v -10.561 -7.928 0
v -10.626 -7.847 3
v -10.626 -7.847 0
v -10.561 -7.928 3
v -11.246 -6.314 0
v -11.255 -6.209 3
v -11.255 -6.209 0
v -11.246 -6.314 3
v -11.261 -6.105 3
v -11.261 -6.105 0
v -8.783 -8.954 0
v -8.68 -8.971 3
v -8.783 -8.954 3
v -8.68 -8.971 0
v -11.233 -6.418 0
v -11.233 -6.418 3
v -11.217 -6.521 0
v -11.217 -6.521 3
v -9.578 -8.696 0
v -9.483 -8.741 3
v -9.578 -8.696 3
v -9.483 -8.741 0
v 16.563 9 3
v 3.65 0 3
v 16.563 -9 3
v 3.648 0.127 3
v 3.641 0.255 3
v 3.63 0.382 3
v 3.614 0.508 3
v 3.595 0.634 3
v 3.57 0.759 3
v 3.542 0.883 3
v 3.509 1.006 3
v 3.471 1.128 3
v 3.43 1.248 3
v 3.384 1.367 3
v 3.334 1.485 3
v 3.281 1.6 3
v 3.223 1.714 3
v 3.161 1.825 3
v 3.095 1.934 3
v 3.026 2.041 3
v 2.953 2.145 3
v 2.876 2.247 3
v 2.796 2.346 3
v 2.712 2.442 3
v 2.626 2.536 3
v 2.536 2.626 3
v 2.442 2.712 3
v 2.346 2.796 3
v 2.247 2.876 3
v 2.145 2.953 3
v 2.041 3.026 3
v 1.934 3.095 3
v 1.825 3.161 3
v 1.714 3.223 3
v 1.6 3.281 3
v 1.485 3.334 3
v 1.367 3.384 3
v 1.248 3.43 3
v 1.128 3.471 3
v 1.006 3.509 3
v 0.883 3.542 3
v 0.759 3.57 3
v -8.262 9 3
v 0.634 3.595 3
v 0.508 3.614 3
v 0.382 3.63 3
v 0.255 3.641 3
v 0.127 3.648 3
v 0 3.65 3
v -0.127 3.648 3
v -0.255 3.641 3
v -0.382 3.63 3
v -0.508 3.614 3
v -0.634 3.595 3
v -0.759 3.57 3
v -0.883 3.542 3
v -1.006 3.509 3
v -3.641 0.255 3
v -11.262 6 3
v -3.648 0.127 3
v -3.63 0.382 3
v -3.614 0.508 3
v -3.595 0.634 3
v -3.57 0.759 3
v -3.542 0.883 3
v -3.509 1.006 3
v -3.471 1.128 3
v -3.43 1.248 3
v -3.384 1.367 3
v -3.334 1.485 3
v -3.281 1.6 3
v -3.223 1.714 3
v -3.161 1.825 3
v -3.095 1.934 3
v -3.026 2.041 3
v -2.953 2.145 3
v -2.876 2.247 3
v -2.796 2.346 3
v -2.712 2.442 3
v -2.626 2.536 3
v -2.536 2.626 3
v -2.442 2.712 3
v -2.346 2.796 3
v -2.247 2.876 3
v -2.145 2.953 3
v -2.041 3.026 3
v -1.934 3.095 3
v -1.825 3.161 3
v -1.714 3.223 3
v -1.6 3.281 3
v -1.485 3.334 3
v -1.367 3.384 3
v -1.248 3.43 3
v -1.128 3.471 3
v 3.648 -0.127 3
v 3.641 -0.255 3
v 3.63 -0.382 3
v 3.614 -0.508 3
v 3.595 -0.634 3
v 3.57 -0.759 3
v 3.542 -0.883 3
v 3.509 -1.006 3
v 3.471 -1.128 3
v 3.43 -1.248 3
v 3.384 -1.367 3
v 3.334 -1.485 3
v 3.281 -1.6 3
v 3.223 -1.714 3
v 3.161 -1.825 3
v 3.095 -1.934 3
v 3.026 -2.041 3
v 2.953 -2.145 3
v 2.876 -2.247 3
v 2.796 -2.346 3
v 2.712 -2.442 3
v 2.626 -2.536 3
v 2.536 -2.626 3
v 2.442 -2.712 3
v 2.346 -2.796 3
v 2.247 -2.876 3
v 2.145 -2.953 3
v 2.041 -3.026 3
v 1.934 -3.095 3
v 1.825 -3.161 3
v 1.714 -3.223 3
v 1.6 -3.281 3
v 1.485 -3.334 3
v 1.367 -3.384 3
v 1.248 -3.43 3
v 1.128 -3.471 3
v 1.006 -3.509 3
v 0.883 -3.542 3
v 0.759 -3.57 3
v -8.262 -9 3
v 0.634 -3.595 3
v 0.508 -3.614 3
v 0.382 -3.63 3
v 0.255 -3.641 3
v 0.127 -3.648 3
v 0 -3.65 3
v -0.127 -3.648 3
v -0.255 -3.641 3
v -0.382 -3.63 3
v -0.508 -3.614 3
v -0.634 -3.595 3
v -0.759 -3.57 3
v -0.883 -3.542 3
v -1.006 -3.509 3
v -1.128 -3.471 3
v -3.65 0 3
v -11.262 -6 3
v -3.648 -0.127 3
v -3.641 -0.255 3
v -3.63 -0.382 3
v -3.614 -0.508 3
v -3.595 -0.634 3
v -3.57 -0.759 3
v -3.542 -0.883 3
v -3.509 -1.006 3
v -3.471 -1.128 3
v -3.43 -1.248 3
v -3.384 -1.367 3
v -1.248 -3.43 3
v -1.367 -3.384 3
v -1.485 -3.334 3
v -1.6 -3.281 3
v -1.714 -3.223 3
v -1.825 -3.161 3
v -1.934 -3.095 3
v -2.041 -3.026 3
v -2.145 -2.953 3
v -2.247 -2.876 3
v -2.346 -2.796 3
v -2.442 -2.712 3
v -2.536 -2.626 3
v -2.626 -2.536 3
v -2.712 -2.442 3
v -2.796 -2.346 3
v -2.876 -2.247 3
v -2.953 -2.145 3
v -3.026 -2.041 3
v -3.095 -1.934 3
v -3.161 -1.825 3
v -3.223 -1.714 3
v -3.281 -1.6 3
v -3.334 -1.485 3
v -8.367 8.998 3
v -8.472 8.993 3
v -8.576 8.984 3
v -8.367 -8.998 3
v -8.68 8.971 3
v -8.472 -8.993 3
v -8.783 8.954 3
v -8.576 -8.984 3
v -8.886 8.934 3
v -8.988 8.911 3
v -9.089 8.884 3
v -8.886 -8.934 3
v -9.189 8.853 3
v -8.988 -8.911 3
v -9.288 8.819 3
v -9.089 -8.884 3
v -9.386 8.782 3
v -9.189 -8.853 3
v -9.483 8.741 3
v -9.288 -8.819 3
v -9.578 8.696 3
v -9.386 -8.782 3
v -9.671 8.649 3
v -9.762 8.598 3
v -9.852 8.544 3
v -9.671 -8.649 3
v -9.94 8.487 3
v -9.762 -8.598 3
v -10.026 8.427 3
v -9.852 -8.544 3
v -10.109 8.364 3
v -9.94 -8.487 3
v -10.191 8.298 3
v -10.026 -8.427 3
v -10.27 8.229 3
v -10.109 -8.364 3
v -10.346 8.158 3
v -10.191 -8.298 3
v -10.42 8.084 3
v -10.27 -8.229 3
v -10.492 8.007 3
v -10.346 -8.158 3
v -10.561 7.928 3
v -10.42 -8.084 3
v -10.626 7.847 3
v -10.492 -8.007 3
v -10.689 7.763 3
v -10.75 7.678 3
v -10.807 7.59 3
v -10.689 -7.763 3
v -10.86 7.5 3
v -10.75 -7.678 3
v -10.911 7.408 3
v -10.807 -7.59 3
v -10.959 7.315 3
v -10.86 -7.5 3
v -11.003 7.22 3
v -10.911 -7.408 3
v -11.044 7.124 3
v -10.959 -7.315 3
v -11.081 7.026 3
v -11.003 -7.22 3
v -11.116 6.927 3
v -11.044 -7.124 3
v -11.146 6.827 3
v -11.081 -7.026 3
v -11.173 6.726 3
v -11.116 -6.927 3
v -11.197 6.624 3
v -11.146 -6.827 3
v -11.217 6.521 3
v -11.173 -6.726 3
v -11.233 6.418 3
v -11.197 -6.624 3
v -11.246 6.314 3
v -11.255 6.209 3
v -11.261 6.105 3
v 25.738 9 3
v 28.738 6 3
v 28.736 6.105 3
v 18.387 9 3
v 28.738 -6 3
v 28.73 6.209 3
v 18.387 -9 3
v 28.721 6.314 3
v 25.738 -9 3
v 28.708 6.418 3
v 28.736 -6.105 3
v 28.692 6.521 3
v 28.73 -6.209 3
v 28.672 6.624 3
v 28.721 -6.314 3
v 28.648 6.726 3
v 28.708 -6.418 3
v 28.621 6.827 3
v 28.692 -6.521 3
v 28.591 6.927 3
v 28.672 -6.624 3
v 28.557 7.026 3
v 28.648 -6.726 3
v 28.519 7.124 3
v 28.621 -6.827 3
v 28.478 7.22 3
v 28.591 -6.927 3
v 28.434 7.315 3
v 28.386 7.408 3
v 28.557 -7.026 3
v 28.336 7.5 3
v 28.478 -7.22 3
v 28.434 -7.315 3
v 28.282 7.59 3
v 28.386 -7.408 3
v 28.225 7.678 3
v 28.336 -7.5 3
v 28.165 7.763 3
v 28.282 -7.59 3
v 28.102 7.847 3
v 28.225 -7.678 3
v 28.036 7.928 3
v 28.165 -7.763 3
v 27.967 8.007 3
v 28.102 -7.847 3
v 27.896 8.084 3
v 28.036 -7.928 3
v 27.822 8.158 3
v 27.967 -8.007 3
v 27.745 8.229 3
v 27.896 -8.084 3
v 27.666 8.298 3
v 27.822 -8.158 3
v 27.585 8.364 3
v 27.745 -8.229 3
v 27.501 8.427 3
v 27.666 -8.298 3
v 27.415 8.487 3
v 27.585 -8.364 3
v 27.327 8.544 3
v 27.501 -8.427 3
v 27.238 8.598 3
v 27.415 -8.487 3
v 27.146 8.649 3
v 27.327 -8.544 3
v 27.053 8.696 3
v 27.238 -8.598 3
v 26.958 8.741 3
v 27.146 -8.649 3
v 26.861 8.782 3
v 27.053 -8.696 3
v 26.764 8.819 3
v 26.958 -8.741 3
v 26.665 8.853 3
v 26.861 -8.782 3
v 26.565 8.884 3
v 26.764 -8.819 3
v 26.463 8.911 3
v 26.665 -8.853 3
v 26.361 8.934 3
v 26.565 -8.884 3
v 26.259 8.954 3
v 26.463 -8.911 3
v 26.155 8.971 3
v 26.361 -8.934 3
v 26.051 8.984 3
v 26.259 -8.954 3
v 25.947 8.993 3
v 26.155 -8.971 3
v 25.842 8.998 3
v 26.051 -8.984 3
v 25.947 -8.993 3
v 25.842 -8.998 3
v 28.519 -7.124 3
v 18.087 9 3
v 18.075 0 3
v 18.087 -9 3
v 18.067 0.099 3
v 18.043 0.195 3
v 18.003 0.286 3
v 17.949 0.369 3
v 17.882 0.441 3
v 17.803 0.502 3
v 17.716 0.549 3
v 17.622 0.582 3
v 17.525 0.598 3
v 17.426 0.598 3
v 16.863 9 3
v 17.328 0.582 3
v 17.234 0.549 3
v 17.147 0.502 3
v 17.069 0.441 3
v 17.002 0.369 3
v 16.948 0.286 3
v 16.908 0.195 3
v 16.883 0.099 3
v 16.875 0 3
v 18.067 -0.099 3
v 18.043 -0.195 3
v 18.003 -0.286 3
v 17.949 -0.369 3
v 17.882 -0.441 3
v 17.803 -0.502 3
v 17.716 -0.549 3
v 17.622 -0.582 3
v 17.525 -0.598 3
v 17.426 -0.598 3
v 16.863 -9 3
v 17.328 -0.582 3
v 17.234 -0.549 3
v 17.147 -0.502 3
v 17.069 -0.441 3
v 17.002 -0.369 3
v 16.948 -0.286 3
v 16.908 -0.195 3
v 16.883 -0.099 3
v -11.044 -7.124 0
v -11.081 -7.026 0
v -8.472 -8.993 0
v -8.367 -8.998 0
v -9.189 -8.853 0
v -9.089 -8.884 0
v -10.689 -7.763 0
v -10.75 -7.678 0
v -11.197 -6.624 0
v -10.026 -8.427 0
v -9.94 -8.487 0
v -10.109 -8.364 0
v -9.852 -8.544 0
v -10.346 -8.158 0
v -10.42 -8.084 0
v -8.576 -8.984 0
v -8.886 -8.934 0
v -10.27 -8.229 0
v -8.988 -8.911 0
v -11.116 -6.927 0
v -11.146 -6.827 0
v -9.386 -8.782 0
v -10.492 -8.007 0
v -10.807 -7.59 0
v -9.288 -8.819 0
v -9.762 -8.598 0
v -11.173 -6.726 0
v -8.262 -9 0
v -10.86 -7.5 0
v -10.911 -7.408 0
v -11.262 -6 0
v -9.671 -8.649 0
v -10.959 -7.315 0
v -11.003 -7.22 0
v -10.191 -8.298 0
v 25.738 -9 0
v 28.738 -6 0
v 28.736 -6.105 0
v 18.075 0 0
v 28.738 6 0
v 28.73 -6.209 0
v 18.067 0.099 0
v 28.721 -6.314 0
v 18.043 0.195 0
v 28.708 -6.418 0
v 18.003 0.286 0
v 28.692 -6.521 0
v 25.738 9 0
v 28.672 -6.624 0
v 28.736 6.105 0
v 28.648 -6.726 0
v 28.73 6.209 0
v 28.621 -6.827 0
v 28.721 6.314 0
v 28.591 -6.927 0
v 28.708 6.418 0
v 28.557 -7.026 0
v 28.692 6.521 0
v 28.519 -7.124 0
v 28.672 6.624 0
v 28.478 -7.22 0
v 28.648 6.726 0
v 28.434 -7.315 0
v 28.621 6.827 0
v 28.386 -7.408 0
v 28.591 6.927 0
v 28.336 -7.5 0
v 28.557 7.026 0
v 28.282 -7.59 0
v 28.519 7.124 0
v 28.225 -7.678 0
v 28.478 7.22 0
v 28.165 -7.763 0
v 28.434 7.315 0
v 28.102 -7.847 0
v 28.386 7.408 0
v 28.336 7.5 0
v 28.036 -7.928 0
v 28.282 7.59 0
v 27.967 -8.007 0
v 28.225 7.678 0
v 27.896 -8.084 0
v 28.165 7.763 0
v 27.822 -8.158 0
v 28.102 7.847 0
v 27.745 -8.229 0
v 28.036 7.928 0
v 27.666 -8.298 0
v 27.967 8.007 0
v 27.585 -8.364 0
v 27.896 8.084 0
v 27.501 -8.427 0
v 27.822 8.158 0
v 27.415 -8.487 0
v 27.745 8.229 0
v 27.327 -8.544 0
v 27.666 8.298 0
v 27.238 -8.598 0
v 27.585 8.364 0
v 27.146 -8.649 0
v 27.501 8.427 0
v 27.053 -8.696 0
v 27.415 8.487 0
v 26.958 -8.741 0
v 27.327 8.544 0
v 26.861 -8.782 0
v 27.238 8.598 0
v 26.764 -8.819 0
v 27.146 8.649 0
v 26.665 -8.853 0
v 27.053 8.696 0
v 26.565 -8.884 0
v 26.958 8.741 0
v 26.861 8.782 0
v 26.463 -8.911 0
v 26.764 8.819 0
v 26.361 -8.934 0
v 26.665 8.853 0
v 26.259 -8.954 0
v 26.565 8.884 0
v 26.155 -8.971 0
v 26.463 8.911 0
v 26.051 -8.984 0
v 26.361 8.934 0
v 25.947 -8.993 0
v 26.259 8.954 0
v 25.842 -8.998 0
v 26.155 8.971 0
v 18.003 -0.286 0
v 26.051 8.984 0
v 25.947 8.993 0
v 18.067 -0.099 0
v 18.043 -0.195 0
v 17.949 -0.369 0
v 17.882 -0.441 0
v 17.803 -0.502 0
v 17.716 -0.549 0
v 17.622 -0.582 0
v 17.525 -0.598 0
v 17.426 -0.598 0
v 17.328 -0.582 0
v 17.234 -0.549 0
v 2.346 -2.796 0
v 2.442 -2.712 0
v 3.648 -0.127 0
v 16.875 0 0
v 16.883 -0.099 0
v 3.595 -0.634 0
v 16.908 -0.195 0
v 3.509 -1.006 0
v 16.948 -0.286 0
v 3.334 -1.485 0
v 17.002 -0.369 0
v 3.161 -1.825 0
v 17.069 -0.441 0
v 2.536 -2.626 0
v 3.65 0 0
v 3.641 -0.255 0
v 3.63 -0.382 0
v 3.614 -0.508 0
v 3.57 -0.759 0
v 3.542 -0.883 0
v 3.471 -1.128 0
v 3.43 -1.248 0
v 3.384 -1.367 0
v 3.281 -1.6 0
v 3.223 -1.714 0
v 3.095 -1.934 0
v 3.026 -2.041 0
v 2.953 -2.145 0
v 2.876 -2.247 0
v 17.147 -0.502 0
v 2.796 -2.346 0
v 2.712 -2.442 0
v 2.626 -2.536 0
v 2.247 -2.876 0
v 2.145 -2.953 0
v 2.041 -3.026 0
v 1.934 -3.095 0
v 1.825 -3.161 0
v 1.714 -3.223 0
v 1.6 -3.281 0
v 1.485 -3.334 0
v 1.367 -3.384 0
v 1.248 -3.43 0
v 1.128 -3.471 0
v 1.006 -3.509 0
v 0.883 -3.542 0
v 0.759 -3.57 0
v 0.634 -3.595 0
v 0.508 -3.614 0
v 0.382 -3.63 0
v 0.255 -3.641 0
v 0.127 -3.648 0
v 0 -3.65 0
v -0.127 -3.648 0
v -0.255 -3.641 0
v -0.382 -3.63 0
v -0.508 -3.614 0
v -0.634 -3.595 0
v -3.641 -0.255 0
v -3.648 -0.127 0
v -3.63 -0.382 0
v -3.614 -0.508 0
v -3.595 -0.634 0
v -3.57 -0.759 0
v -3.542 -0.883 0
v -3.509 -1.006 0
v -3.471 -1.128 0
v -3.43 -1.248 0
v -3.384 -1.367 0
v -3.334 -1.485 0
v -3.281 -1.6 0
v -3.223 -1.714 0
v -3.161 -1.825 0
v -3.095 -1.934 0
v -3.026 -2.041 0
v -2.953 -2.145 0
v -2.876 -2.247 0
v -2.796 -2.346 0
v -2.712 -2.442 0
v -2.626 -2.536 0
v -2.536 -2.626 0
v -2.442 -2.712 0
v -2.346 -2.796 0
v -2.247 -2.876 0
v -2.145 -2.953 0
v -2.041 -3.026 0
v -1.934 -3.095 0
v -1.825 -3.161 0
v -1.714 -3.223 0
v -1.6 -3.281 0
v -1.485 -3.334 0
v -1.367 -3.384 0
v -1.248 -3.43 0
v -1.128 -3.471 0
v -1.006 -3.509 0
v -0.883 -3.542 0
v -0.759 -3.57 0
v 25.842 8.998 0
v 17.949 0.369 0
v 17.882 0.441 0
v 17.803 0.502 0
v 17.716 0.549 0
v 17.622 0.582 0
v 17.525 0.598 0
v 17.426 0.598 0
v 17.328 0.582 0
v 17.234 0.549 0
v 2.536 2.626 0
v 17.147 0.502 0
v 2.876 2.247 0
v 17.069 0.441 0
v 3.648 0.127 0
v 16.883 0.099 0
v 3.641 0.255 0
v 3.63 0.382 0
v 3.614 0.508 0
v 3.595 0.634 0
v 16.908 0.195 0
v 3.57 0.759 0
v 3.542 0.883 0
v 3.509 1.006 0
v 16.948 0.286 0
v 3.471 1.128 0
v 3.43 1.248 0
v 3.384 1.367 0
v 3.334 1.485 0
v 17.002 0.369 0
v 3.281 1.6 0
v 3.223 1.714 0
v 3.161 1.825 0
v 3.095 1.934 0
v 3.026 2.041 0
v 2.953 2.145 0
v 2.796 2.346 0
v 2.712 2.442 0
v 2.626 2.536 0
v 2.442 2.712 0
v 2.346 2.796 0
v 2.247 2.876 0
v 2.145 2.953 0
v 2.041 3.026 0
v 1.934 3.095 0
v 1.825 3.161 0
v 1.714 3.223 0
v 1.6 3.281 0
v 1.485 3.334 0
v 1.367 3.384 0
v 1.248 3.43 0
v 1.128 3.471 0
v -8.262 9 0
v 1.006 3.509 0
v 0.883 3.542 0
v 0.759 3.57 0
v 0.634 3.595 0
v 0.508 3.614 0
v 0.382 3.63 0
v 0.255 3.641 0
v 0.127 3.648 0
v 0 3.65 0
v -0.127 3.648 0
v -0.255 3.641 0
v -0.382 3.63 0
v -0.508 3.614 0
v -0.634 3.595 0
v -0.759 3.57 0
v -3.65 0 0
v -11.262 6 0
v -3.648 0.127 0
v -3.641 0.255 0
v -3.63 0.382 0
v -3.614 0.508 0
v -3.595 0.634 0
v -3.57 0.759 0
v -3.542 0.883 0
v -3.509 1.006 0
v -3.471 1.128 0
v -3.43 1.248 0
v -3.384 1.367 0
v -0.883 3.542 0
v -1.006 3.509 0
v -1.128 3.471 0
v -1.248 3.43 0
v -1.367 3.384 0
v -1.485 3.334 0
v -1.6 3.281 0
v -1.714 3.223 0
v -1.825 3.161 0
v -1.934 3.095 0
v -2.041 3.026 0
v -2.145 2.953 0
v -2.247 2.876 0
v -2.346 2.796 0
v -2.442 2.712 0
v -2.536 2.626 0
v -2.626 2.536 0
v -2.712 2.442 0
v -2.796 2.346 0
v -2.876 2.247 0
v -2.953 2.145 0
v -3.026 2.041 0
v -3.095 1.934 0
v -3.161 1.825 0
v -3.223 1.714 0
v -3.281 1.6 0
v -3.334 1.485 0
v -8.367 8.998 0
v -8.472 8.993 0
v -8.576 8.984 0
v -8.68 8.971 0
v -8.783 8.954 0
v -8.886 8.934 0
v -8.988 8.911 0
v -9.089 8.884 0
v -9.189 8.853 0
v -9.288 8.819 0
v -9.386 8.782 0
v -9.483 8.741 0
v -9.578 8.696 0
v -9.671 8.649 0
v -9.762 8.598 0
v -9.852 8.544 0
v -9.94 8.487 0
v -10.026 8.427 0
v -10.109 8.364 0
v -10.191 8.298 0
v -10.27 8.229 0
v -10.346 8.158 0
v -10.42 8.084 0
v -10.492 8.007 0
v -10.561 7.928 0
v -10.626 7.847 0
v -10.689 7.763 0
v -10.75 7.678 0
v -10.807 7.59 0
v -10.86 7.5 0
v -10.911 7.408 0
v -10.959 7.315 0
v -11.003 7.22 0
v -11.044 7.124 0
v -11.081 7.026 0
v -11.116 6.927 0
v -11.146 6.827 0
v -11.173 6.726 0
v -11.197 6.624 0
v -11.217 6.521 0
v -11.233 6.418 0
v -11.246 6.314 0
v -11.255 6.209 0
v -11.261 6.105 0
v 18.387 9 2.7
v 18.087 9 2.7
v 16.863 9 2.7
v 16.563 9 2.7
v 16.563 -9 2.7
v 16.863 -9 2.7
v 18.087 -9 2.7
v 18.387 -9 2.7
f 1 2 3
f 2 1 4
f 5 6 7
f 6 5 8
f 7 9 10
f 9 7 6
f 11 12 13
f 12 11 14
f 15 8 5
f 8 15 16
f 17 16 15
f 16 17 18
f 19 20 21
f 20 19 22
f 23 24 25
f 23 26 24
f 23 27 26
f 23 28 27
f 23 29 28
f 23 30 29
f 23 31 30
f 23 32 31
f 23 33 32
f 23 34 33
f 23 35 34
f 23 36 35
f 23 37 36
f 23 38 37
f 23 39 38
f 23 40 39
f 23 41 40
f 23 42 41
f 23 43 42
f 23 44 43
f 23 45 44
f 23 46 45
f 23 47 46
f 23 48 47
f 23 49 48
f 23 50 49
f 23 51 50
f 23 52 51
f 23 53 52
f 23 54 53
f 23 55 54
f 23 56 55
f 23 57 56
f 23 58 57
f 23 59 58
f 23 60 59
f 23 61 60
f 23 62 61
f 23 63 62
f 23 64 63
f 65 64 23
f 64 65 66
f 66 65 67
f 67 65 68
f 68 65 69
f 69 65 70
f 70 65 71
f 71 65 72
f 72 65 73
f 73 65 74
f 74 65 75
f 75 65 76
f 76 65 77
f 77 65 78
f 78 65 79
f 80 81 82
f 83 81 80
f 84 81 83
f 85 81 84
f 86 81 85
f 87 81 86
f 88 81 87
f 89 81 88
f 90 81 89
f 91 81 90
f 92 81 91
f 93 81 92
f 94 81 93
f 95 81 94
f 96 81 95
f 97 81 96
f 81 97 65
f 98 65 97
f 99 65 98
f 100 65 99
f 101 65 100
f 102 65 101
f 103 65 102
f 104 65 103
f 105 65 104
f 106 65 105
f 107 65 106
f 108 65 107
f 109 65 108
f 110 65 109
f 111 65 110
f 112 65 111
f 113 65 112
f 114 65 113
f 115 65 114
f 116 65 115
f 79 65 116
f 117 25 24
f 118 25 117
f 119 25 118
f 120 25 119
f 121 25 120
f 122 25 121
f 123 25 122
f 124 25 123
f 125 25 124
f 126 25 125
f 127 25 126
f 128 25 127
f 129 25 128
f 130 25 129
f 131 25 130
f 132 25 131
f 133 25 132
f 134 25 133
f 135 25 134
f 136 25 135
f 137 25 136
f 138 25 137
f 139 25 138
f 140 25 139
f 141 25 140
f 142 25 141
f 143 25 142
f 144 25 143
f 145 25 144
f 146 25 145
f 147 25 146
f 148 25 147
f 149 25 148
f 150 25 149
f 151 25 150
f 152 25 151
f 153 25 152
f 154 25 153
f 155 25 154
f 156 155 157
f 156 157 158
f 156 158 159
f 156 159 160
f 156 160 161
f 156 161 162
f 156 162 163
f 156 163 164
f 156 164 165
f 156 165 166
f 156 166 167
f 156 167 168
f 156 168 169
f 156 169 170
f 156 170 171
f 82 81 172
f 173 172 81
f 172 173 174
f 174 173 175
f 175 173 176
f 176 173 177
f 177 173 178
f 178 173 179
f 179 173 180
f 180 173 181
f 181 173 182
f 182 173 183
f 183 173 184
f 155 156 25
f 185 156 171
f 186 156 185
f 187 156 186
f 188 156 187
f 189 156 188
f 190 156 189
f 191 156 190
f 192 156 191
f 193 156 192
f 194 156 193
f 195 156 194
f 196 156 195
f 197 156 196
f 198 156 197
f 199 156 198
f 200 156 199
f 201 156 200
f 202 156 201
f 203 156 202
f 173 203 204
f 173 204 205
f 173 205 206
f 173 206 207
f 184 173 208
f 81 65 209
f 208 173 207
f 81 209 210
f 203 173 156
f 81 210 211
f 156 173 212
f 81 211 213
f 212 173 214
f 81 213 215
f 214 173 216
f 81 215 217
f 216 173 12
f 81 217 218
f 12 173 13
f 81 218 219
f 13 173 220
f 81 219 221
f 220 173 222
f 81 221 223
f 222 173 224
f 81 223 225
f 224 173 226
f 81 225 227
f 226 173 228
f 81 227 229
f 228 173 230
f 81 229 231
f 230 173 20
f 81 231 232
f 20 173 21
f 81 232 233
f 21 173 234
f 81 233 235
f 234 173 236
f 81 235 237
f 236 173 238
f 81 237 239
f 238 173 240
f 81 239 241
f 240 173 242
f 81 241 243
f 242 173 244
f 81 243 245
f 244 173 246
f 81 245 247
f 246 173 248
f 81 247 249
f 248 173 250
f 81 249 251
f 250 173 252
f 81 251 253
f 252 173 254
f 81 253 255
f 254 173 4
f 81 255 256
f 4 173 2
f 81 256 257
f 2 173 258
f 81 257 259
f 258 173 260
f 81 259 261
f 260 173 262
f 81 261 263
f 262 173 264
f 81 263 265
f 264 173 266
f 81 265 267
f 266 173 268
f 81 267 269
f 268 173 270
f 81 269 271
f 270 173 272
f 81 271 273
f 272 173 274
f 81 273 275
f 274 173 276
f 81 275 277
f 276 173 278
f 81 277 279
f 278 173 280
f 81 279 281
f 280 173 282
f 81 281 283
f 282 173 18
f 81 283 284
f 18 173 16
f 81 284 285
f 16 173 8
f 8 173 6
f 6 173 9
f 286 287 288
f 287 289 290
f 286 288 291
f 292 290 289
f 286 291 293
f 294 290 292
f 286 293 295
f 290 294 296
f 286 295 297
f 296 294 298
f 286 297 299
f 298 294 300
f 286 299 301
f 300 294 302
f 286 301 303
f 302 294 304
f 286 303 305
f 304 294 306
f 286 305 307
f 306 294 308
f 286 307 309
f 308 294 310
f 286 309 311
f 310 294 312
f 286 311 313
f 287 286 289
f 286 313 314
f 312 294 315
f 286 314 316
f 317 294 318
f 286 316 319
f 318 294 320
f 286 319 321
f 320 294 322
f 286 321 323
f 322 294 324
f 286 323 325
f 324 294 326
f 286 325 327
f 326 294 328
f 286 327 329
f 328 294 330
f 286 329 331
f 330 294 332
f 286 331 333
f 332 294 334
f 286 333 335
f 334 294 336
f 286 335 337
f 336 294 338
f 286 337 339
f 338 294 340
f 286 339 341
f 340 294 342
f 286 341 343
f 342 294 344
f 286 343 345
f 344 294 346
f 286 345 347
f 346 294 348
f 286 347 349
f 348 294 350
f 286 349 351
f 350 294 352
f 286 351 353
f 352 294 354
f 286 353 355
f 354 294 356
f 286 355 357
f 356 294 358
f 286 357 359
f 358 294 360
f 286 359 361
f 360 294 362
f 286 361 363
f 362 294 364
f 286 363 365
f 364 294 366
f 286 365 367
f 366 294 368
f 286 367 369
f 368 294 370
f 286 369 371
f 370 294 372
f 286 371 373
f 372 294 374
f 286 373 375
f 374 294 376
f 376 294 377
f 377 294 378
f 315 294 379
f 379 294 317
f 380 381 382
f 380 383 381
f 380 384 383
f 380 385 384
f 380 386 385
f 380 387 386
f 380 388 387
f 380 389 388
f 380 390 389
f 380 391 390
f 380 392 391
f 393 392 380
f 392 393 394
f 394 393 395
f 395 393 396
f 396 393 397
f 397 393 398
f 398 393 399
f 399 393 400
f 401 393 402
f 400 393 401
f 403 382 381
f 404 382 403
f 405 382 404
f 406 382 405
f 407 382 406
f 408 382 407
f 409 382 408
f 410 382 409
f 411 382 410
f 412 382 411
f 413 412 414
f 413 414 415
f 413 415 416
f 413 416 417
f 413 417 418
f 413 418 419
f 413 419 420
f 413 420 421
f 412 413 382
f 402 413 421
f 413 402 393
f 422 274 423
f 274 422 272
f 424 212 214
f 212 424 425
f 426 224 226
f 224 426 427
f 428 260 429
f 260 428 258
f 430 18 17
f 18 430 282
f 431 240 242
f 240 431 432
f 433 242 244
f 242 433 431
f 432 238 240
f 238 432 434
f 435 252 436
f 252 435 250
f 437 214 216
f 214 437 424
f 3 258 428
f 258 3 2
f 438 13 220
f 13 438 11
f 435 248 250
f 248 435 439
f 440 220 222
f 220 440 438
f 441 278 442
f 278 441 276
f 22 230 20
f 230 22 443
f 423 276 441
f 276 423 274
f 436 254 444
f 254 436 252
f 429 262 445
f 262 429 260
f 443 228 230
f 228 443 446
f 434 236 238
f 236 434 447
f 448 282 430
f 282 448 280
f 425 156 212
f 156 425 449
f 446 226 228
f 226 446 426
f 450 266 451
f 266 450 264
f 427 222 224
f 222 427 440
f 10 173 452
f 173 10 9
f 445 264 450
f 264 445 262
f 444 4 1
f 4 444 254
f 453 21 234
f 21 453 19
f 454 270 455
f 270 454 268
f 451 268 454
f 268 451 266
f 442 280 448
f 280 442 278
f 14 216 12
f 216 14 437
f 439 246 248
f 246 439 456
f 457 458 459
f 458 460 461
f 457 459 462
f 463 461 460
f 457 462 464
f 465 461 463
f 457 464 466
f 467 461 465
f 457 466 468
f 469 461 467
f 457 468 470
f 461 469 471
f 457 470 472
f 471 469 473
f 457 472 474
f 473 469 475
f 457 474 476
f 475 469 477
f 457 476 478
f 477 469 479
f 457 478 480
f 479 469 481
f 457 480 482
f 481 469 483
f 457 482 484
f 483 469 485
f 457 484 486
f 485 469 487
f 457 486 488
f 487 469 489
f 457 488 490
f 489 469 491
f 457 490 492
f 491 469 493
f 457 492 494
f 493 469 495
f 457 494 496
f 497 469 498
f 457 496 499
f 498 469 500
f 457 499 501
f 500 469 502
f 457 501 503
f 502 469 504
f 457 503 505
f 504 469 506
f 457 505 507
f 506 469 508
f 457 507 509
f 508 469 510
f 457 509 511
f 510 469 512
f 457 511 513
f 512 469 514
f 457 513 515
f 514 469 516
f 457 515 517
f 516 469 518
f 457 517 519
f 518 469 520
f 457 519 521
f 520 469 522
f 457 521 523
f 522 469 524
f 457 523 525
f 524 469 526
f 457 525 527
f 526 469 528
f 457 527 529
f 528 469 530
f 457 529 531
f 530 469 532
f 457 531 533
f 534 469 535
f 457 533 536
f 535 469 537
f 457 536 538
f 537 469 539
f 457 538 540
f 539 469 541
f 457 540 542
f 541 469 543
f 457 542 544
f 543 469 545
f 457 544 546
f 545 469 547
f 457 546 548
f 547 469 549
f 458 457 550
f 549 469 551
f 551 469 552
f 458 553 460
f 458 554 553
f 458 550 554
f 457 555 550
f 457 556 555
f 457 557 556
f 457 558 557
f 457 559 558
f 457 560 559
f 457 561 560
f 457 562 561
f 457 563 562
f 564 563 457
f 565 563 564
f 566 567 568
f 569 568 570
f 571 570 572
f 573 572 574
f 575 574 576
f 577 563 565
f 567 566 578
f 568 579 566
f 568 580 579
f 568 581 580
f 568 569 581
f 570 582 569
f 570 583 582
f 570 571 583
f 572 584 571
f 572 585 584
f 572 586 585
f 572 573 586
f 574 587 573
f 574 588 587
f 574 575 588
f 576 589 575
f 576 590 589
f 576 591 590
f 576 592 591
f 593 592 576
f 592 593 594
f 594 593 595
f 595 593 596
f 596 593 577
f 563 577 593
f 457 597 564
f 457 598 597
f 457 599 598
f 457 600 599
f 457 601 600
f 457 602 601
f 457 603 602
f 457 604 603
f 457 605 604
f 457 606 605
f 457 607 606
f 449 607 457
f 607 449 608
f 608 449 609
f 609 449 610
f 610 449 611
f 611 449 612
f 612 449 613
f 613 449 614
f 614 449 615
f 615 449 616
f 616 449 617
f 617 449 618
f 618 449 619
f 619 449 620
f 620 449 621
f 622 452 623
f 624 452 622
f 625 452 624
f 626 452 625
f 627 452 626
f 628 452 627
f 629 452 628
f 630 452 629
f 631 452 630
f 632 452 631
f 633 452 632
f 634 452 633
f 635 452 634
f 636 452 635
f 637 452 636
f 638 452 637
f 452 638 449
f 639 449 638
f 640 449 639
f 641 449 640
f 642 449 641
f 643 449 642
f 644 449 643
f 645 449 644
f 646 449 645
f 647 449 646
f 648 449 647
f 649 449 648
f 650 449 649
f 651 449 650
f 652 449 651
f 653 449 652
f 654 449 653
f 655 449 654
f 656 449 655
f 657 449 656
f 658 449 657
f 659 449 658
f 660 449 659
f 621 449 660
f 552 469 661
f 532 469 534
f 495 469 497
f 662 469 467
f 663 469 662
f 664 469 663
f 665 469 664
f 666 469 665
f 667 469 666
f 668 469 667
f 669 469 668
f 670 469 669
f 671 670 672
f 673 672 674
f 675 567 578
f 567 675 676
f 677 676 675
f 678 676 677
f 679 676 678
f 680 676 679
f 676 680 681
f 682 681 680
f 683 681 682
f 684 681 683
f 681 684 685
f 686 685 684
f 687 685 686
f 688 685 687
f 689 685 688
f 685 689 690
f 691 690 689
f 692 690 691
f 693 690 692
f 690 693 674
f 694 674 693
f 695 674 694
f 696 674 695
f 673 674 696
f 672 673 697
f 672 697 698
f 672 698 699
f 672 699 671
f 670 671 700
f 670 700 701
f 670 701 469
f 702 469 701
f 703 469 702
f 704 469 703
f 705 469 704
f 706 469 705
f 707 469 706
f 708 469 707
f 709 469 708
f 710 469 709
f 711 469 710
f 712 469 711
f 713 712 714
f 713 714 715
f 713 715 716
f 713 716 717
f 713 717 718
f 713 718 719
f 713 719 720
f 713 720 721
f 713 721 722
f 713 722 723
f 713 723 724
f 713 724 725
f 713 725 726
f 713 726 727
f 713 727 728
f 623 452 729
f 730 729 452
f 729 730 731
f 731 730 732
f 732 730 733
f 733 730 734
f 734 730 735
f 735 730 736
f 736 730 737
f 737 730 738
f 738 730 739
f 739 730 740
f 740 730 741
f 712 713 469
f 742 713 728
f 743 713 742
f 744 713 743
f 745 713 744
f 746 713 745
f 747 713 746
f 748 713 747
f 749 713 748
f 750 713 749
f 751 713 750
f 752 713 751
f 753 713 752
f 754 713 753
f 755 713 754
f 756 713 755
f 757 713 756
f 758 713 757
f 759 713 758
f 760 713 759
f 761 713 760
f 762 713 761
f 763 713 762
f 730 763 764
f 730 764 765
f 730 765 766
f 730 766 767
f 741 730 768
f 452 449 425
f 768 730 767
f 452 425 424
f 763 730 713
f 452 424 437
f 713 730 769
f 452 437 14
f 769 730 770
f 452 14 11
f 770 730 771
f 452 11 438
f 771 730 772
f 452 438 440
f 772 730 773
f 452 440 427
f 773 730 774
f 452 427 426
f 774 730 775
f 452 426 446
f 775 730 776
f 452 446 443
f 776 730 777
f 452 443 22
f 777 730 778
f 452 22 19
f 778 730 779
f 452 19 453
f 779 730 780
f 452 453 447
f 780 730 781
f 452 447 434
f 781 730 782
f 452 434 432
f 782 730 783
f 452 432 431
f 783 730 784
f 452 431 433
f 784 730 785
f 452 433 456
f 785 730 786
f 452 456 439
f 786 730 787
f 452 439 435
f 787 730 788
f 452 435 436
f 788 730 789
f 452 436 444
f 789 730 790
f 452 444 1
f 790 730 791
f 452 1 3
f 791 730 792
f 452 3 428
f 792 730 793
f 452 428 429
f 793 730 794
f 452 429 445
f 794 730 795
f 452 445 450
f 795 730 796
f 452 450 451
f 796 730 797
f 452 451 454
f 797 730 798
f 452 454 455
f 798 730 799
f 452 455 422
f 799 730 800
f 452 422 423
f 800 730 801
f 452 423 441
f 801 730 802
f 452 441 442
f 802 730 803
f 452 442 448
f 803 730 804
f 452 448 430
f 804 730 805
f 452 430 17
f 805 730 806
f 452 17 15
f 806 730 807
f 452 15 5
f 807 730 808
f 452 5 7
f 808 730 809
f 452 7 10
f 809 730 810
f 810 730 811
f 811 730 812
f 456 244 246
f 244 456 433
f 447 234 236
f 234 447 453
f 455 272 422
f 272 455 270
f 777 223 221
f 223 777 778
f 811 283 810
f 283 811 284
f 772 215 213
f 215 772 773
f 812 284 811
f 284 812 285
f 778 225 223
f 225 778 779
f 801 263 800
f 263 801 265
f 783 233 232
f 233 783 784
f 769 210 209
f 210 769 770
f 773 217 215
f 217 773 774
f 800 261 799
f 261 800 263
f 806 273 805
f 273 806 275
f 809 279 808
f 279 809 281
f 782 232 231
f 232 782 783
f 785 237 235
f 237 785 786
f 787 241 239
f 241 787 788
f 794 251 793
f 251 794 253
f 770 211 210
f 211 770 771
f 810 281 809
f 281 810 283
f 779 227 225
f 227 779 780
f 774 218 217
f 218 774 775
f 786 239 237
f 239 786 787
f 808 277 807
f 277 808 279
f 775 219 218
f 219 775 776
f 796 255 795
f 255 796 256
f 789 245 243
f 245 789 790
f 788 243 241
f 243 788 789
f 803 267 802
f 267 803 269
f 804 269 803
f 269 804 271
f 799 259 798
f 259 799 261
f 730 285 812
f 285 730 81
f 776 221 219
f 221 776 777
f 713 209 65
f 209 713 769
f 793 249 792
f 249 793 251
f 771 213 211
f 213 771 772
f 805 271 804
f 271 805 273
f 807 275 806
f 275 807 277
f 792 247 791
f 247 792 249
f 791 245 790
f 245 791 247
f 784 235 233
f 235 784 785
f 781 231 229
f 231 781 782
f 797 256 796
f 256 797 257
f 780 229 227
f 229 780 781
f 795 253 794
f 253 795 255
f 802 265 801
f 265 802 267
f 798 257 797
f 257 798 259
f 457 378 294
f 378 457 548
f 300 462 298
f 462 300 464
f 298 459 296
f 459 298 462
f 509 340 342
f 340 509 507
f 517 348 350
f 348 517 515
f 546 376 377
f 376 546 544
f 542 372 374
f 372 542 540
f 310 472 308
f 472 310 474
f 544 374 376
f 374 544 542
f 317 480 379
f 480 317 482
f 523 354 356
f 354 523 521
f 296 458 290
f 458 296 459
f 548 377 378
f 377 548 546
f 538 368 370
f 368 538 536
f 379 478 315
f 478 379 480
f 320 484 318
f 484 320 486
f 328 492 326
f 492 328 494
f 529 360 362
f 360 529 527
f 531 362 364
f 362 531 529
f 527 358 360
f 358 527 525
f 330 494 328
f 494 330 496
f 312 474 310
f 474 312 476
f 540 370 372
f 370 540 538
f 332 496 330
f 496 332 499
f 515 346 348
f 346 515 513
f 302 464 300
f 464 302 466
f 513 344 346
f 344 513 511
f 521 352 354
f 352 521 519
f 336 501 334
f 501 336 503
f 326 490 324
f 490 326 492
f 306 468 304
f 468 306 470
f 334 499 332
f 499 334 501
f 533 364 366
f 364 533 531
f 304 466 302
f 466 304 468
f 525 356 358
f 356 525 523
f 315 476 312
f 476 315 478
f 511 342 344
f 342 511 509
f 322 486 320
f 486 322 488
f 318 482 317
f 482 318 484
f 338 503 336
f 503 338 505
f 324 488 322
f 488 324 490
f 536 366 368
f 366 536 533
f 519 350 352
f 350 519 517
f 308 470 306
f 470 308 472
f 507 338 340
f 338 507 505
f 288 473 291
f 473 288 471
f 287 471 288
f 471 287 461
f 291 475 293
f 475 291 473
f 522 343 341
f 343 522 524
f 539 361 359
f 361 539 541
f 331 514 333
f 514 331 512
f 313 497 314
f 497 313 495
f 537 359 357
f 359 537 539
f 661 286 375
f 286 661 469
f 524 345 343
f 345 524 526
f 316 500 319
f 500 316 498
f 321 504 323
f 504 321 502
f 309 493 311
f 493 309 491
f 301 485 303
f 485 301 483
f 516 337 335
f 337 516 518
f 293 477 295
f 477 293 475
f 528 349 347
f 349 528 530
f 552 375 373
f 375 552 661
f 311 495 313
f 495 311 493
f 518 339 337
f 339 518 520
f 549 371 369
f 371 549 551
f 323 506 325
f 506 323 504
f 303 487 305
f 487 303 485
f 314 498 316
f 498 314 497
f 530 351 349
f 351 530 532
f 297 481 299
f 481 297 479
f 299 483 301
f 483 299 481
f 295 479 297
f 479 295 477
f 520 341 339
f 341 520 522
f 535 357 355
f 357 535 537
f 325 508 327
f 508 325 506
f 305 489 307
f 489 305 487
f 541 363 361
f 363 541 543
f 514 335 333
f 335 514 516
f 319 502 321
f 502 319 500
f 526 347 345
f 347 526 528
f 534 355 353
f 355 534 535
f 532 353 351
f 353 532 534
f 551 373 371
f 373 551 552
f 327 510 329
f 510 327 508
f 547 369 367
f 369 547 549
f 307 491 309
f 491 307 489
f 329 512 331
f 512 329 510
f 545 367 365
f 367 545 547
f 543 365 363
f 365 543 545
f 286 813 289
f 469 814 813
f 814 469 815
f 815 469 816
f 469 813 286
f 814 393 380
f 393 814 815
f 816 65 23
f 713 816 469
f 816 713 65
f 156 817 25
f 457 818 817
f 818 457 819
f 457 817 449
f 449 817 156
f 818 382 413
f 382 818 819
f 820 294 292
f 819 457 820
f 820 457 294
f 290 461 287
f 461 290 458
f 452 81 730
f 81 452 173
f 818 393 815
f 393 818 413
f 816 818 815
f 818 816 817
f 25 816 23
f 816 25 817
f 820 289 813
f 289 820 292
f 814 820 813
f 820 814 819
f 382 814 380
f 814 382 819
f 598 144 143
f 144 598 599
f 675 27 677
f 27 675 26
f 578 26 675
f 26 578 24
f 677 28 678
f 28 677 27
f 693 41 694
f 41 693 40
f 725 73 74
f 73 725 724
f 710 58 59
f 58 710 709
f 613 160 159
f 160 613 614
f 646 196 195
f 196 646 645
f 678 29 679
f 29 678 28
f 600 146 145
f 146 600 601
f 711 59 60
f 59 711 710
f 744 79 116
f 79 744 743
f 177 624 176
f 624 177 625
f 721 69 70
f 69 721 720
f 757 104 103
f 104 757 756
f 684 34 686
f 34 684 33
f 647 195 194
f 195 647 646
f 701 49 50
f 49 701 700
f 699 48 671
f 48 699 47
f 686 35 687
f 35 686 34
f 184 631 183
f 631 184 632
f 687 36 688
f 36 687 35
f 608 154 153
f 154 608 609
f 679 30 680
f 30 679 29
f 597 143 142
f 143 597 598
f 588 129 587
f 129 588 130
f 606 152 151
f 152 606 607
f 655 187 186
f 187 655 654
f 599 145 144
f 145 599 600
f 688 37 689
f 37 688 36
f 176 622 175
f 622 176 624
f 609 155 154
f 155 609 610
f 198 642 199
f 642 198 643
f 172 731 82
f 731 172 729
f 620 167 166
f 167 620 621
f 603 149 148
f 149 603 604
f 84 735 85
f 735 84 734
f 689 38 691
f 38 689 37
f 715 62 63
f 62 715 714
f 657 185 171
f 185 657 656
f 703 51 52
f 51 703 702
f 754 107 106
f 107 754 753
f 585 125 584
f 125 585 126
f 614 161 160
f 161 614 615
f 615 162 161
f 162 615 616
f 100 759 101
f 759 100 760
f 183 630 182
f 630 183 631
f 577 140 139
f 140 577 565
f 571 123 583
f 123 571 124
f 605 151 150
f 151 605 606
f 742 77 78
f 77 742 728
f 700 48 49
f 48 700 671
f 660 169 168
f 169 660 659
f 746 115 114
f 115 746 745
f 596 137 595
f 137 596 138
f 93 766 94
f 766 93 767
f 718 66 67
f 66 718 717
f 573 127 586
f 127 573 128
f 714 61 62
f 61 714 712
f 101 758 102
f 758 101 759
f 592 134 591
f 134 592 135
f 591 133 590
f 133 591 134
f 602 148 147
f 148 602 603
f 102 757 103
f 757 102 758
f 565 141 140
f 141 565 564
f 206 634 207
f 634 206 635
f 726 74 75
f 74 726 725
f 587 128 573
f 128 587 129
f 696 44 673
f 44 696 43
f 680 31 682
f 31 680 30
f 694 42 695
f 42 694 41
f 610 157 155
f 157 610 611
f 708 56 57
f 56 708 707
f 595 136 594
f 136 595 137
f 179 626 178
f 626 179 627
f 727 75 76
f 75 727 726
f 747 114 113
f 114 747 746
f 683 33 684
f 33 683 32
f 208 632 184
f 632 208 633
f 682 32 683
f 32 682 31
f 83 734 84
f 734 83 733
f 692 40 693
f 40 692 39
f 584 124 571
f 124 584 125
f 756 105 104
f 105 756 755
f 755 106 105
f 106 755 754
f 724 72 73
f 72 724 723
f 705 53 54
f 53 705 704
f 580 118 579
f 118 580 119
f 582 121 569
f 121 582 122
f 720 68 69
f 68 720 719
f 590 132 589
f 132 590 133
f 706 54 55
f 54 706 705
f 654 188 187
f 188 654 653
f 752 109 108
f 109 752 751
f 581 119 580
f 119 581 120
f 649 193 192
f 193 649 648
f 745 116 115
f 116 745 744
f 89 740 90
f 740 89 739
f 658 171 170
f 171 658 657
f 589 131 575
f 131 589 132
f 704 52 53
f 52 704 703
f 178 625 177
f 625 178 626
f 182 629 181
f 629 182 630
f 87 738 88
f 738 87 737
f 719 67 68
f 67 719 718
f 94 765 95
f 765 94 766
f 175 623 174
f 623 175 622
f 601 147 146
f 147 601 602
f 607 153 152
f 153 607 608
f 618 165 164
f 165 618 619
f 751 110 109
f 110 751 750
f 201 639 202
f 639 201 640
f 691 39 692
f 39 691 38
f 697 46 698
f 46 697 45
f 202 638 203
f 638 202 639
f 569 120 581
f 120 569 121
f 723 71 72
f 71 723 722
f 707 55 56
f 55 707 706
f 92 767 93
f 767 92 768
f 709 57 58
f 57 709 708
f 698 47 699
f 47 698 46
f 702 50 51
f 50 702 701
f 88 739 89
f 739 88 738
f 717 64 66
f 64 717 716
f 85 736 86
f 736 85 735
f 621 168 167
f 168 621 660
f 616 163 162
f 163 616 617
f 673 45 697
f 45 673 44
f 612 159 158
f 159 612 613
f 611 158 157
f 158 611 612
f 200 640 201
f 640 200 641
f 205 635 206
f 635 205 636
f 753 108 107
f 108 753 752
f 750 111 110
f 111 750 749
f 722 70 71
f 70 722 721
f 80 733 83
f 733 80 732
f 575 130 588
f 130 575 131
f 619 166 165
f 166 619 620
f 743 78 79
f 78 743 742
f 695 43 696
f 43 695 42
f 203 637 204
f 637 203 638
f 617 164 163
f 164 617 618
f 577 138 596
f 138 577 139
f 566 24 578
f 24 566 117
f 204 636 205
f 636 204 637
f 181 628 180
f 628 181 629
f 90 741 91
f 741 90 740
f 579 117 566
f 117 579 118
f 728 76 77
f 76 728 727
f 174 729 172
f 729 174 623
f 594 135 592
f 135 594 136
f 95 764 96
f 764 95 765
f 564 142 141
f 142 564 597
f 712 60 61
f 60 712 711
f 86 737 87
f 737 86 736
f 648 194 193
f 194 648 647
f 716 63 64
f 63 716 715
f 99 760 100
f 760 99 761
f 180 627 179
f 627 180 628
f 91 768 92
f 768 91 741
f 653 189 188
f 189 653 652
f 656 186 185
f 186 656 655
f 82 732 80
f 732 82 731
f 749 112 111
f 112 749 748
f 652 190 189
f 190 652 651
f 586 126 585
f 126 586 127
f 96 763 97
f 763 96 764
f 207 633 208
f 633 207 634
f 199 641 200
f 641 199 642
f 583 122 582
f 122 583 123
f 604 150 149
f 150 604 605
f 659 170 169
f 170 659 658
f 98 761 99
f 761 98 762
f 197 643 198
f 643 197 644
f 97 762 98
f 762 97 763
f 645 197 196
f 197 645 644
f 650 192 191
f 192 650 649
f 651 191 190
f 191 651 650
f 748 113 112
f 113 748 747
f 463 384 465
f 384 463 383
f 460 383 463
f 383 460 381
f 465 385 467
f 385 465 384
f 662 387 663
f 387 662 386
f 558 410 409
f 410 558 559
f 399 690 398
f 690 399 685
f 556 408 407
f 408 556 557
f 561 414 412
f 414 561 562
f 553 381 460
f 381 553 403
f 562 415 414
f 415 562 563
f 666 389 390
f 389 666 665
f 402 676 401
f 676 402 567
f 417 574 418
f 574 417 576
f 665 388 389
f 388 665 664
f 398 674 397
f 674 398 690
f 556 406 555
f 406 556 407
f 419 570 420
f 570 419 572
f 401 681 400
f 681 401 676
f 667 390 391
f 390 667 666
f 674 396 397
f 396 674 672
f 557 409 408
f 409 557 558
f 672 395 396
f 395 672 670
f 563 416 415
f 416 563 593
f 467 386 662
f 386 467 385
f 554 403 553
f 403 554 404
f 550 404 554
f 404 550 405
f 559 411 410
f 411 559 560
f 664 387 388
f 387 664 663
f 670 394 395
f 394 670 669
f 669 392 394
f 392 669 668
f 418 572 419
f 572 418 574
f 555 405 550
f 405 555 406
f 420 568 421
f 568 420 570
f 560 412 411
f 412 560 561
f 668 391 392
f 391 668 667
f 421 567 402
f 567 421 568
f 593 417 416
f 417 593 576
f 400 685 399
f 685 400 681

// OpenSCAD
// file: ../lib/common.scad
// Shared helpers for the AR turntable part models.
//
// Every part file holds a parameter table P. Each row is:
//   [id, description, value_mm, evidence, display_unit, source_or_how_to_check]
//
// Evidence codes:
//   F  factory document          O  owner report
//   C  community drawing         S  industry standard
//   D  design choice             M  measured for this repository
//   DV derived from cited sources, not yet verified on a part. The source
//      column holds the derivation: the formula, each input with its source,
//      and how to verify. Drawn in blue. Needs a row in TO-CONFIRM.md whose
//      value starts with "Derived:". Change to M once measured.
//   PH placeholder: chosen only so the model has a shape. It is NOT a
//      measurement. Drawn in red. Replace it, and change the code, once it
//      is measured.
//
// Every part file also emits metadata naming the part page, the part, the
// version, the material and the tables it fits, each fit with its evidence:
//   ["part", "parts/counterweight.md"], ["part_name", "Counterweight"],
//   ["version", "XA brass weight, 1961 to 1979"], ["material", "Brass"],
//   ["fits", [["XA", "Fitted by AR", "XA service manual p. 4"], ["XB", "Unconfirmed", ""]]]
// The fit word is one of: Fitted by AR, Fits, Fits with a change, Does not
// fit, Unconfirmed. build.py prints these in the title block and writes the
// drawings table of cad/README.md from them.
// License: CC BY-SA 4.0. See LICENSE at the repository root.

IN = 25.4;      // one inch, in mm. All model geometry is in mm.
EPS = 0.01;     // overlap so boolean cuts do not leave zero-thickness skins
$fa = 2;
$fs = 0.1;

// Value of parameter `id` in table t.
function pv(t, id) = t[search([id], t)[0]][2];

// Print part data for cad/tools/build.py, which reads it from the console.
module emit(meta, params, dims = []) {
    echo(META = meta);
    for (row = params) echo(PARAM = row);
    for (row = dims) echo(DIM = row);
}

// Rounded rectangle prism: centered in XY, from z = 0 to z = h.
module rr_prism(l, w, h, r) {
    translate([-l / 2 + r, -w / 2, 0]) cube([l - 2 * r, w, h]);
    translate([-l / 2, -w / 2 + r, 0]) cube([l, w - 2 * r, h]);
    for (sx = [-1, 1], sy = [-1, 1])
        translate([sx * (l / 2 - r), sy * (w / 2 - r), 0]) cylinder(r = r, h = h);
}

// Slot along X: `c` is the distance between end-radius centers.
module slot_prism(c, w, h) {
    translate([-c / 2, -w / 2, 0]) cube([c, w, h]);
    for (sx = [-1, 1]) translate([sx * c / 2, 0, 0]) cylinder(d = w, h = h);
}
// main file
// Overhang gauge for the AR arm: a new design from one factory dimension.
// It is not a copy of AR's gauge (XA part 914, XB P/N 402001), whose outline
// has not been found. Villchur, Audio, Sept 1962, p. 69: the template fits over
// the spindle, and with the needle in its small hole the overhang is correct.
// License: CC BY-SA 4.0. See LICENSE at the repository root.
include <../lib/common.scad>

variant = 1;
flat = false;  // true exports the 1:1 cutting outline

P = [
    ["GA1", "Spindle center to needle hole", 0.688 * IN, "F", "in", "Villchur 1962, p. 69; XB drawing 119, note 10: 0.688 in +/- 0.030"],
    ["GA2", "Spindle hole diameter", 7.3, "PH", "mm", "Micrometer on your spindle; the hole must fit without play"],
    ["GA3", "Needle hole diameter", 1.2, "PH", "mm", "Choose so a stylus tip seats without touching the cantilever"],
    ["GA4", "Plate length", 40, "PH", "mm", "Design freedom; the original outline is unknown"],
    ["GA5", "Plate width", 18, "PH", "mm", "Design freedom; the original outline is unknown"],
    ["GA6", "Plate thickness", 3, "PH", "mm", "Check it clears the spindle shoulder and the arm's cueing height"],
    ["GA7", "Tolerance on the overhang, marked as two scribed lines", 0.030 * IN, "F", "in", "XB drawing 119, note 10: 0.688 in +/- 0.030. The lines show the allowed band; the hole is the nominal"],
];

c = pv(P, "GA1");
sd = pv(P, "GA2");
nd = pv(P, "GA3");
pl = pv(P, "GA4");
pw = pv(P, "GA5");
pt = pv(P, "GA6");
tol = pv(P, "GA7");
mark_w = 0.3;   // scribed line width and depth, a design choice
mark_d = 0.3;

module part() {
    difference() {
        translate([c / 2, 0, 0]) rr_prism(pl, pw, pt, 3);
        translate([0, 0, -1]) cylinder(d = sd, h = pt + 2);
        translate([c, 0, -1]) cylinder(d = nd, h = pt + 2);
        // Tolerance marks: two lines across the plate at +/- GA7 from the needle hole.
        for (s = [-1, 1])
            translate([c + s * tol - mark_w / 2, -pw / 2 - 1, pt - mark_d]) cube([mark_w, pw + 2, mark_d + 1]);
    }
}

emit(
    [
        ["id", "overhang-gauge-new-pmma"],
        ["title", "Overhang template for the AR arm, new design"],
        ["status", "PRELIMINARY"],
        ["part", "parts/overhang-template.md"],
        ["part_name", "Overhang template"],
        ["version", "New design from the factory overhang; AR's own outline (XA part 914, XB P/N 402001) is not known"],
        ["scope", "New design. Critical dimension from the 1962 paper and XB drawing 119. Other dimensions are not AR's"],
        ["material", "Clear acrylic (PMMA) suggested"],
        ["density", 1.18],
        ["fits", [["XA", "Fits", "Villchur 1962, Part 1, p. 69: overhang 0.688 in on the AR arm"],
                  ["XB", "Fits", "drawing 119, note 10: 0.688 in +/- 0.030"],
                  ["AR77XB", "Unconfirmed", ""]]],
        ["make", "Mill or laser cut. 1 off"],
        ["flat", true],
        ["views", ["front", "top", "right", "iso"]],
        ["notes", [
            "Only the spindle-to-hole distance is functional. XB note 10 allows +/- 0.030 in; keep it far tighter on the gauge.",
            "The two scribed lines at +/- 0.030 in (GA7) show the XB tolerance band on the overhang. A stylus inside the band passes on an XB; the XA sets no tolerance.",
            "Set the overhang with the needle hole on the line from the spindle to the arm pivot.",
            "Not calibrated. Check the hole distance before treating it as a setup tool.",
        ]],
    ],
    P,
    [
        ["top", "h", [0, pw / 2, 0], [c, pw / 2, 0], 16, "GA1"],
        ["top", "h", [c, -pw / 2, 0], [c + tol, -pw / 2, 0], -16, "GA7", "±"],
        ["top", "h", [c / 2 - pl / 2, 0, 0], [c / 2 + pl / 2, 0, 0], -9, "GA4"],
        ["top", "v", [c / 2 + pl / 2, -pw / 2, 0], [c / 2 + pl / 2, pw / 2, 0], 9, "GA5"],
        ["top", "d", [0, 0, 0], sd / 2, 7, "GA2", "Ø", 125],
        ["top", "d", [c, 0, 0], nd / 2, 7, "GA3", "Ø", 65],
        ["top", "cl", [0, -pw / 2 - 2, 0], [0, pw / 2 + 2, 0]],
        ["top", "cl", [c, -pw / 2 - 2, 0], [c, pw / 2 + 2, 0]],
        ["front", "v", [c / 2 + pl / 2, 0, 0], [c / 2 + pl / 2, 0, pt], 9, "GA6"],
    ]
);

if (flat) projection() part(); else part();
